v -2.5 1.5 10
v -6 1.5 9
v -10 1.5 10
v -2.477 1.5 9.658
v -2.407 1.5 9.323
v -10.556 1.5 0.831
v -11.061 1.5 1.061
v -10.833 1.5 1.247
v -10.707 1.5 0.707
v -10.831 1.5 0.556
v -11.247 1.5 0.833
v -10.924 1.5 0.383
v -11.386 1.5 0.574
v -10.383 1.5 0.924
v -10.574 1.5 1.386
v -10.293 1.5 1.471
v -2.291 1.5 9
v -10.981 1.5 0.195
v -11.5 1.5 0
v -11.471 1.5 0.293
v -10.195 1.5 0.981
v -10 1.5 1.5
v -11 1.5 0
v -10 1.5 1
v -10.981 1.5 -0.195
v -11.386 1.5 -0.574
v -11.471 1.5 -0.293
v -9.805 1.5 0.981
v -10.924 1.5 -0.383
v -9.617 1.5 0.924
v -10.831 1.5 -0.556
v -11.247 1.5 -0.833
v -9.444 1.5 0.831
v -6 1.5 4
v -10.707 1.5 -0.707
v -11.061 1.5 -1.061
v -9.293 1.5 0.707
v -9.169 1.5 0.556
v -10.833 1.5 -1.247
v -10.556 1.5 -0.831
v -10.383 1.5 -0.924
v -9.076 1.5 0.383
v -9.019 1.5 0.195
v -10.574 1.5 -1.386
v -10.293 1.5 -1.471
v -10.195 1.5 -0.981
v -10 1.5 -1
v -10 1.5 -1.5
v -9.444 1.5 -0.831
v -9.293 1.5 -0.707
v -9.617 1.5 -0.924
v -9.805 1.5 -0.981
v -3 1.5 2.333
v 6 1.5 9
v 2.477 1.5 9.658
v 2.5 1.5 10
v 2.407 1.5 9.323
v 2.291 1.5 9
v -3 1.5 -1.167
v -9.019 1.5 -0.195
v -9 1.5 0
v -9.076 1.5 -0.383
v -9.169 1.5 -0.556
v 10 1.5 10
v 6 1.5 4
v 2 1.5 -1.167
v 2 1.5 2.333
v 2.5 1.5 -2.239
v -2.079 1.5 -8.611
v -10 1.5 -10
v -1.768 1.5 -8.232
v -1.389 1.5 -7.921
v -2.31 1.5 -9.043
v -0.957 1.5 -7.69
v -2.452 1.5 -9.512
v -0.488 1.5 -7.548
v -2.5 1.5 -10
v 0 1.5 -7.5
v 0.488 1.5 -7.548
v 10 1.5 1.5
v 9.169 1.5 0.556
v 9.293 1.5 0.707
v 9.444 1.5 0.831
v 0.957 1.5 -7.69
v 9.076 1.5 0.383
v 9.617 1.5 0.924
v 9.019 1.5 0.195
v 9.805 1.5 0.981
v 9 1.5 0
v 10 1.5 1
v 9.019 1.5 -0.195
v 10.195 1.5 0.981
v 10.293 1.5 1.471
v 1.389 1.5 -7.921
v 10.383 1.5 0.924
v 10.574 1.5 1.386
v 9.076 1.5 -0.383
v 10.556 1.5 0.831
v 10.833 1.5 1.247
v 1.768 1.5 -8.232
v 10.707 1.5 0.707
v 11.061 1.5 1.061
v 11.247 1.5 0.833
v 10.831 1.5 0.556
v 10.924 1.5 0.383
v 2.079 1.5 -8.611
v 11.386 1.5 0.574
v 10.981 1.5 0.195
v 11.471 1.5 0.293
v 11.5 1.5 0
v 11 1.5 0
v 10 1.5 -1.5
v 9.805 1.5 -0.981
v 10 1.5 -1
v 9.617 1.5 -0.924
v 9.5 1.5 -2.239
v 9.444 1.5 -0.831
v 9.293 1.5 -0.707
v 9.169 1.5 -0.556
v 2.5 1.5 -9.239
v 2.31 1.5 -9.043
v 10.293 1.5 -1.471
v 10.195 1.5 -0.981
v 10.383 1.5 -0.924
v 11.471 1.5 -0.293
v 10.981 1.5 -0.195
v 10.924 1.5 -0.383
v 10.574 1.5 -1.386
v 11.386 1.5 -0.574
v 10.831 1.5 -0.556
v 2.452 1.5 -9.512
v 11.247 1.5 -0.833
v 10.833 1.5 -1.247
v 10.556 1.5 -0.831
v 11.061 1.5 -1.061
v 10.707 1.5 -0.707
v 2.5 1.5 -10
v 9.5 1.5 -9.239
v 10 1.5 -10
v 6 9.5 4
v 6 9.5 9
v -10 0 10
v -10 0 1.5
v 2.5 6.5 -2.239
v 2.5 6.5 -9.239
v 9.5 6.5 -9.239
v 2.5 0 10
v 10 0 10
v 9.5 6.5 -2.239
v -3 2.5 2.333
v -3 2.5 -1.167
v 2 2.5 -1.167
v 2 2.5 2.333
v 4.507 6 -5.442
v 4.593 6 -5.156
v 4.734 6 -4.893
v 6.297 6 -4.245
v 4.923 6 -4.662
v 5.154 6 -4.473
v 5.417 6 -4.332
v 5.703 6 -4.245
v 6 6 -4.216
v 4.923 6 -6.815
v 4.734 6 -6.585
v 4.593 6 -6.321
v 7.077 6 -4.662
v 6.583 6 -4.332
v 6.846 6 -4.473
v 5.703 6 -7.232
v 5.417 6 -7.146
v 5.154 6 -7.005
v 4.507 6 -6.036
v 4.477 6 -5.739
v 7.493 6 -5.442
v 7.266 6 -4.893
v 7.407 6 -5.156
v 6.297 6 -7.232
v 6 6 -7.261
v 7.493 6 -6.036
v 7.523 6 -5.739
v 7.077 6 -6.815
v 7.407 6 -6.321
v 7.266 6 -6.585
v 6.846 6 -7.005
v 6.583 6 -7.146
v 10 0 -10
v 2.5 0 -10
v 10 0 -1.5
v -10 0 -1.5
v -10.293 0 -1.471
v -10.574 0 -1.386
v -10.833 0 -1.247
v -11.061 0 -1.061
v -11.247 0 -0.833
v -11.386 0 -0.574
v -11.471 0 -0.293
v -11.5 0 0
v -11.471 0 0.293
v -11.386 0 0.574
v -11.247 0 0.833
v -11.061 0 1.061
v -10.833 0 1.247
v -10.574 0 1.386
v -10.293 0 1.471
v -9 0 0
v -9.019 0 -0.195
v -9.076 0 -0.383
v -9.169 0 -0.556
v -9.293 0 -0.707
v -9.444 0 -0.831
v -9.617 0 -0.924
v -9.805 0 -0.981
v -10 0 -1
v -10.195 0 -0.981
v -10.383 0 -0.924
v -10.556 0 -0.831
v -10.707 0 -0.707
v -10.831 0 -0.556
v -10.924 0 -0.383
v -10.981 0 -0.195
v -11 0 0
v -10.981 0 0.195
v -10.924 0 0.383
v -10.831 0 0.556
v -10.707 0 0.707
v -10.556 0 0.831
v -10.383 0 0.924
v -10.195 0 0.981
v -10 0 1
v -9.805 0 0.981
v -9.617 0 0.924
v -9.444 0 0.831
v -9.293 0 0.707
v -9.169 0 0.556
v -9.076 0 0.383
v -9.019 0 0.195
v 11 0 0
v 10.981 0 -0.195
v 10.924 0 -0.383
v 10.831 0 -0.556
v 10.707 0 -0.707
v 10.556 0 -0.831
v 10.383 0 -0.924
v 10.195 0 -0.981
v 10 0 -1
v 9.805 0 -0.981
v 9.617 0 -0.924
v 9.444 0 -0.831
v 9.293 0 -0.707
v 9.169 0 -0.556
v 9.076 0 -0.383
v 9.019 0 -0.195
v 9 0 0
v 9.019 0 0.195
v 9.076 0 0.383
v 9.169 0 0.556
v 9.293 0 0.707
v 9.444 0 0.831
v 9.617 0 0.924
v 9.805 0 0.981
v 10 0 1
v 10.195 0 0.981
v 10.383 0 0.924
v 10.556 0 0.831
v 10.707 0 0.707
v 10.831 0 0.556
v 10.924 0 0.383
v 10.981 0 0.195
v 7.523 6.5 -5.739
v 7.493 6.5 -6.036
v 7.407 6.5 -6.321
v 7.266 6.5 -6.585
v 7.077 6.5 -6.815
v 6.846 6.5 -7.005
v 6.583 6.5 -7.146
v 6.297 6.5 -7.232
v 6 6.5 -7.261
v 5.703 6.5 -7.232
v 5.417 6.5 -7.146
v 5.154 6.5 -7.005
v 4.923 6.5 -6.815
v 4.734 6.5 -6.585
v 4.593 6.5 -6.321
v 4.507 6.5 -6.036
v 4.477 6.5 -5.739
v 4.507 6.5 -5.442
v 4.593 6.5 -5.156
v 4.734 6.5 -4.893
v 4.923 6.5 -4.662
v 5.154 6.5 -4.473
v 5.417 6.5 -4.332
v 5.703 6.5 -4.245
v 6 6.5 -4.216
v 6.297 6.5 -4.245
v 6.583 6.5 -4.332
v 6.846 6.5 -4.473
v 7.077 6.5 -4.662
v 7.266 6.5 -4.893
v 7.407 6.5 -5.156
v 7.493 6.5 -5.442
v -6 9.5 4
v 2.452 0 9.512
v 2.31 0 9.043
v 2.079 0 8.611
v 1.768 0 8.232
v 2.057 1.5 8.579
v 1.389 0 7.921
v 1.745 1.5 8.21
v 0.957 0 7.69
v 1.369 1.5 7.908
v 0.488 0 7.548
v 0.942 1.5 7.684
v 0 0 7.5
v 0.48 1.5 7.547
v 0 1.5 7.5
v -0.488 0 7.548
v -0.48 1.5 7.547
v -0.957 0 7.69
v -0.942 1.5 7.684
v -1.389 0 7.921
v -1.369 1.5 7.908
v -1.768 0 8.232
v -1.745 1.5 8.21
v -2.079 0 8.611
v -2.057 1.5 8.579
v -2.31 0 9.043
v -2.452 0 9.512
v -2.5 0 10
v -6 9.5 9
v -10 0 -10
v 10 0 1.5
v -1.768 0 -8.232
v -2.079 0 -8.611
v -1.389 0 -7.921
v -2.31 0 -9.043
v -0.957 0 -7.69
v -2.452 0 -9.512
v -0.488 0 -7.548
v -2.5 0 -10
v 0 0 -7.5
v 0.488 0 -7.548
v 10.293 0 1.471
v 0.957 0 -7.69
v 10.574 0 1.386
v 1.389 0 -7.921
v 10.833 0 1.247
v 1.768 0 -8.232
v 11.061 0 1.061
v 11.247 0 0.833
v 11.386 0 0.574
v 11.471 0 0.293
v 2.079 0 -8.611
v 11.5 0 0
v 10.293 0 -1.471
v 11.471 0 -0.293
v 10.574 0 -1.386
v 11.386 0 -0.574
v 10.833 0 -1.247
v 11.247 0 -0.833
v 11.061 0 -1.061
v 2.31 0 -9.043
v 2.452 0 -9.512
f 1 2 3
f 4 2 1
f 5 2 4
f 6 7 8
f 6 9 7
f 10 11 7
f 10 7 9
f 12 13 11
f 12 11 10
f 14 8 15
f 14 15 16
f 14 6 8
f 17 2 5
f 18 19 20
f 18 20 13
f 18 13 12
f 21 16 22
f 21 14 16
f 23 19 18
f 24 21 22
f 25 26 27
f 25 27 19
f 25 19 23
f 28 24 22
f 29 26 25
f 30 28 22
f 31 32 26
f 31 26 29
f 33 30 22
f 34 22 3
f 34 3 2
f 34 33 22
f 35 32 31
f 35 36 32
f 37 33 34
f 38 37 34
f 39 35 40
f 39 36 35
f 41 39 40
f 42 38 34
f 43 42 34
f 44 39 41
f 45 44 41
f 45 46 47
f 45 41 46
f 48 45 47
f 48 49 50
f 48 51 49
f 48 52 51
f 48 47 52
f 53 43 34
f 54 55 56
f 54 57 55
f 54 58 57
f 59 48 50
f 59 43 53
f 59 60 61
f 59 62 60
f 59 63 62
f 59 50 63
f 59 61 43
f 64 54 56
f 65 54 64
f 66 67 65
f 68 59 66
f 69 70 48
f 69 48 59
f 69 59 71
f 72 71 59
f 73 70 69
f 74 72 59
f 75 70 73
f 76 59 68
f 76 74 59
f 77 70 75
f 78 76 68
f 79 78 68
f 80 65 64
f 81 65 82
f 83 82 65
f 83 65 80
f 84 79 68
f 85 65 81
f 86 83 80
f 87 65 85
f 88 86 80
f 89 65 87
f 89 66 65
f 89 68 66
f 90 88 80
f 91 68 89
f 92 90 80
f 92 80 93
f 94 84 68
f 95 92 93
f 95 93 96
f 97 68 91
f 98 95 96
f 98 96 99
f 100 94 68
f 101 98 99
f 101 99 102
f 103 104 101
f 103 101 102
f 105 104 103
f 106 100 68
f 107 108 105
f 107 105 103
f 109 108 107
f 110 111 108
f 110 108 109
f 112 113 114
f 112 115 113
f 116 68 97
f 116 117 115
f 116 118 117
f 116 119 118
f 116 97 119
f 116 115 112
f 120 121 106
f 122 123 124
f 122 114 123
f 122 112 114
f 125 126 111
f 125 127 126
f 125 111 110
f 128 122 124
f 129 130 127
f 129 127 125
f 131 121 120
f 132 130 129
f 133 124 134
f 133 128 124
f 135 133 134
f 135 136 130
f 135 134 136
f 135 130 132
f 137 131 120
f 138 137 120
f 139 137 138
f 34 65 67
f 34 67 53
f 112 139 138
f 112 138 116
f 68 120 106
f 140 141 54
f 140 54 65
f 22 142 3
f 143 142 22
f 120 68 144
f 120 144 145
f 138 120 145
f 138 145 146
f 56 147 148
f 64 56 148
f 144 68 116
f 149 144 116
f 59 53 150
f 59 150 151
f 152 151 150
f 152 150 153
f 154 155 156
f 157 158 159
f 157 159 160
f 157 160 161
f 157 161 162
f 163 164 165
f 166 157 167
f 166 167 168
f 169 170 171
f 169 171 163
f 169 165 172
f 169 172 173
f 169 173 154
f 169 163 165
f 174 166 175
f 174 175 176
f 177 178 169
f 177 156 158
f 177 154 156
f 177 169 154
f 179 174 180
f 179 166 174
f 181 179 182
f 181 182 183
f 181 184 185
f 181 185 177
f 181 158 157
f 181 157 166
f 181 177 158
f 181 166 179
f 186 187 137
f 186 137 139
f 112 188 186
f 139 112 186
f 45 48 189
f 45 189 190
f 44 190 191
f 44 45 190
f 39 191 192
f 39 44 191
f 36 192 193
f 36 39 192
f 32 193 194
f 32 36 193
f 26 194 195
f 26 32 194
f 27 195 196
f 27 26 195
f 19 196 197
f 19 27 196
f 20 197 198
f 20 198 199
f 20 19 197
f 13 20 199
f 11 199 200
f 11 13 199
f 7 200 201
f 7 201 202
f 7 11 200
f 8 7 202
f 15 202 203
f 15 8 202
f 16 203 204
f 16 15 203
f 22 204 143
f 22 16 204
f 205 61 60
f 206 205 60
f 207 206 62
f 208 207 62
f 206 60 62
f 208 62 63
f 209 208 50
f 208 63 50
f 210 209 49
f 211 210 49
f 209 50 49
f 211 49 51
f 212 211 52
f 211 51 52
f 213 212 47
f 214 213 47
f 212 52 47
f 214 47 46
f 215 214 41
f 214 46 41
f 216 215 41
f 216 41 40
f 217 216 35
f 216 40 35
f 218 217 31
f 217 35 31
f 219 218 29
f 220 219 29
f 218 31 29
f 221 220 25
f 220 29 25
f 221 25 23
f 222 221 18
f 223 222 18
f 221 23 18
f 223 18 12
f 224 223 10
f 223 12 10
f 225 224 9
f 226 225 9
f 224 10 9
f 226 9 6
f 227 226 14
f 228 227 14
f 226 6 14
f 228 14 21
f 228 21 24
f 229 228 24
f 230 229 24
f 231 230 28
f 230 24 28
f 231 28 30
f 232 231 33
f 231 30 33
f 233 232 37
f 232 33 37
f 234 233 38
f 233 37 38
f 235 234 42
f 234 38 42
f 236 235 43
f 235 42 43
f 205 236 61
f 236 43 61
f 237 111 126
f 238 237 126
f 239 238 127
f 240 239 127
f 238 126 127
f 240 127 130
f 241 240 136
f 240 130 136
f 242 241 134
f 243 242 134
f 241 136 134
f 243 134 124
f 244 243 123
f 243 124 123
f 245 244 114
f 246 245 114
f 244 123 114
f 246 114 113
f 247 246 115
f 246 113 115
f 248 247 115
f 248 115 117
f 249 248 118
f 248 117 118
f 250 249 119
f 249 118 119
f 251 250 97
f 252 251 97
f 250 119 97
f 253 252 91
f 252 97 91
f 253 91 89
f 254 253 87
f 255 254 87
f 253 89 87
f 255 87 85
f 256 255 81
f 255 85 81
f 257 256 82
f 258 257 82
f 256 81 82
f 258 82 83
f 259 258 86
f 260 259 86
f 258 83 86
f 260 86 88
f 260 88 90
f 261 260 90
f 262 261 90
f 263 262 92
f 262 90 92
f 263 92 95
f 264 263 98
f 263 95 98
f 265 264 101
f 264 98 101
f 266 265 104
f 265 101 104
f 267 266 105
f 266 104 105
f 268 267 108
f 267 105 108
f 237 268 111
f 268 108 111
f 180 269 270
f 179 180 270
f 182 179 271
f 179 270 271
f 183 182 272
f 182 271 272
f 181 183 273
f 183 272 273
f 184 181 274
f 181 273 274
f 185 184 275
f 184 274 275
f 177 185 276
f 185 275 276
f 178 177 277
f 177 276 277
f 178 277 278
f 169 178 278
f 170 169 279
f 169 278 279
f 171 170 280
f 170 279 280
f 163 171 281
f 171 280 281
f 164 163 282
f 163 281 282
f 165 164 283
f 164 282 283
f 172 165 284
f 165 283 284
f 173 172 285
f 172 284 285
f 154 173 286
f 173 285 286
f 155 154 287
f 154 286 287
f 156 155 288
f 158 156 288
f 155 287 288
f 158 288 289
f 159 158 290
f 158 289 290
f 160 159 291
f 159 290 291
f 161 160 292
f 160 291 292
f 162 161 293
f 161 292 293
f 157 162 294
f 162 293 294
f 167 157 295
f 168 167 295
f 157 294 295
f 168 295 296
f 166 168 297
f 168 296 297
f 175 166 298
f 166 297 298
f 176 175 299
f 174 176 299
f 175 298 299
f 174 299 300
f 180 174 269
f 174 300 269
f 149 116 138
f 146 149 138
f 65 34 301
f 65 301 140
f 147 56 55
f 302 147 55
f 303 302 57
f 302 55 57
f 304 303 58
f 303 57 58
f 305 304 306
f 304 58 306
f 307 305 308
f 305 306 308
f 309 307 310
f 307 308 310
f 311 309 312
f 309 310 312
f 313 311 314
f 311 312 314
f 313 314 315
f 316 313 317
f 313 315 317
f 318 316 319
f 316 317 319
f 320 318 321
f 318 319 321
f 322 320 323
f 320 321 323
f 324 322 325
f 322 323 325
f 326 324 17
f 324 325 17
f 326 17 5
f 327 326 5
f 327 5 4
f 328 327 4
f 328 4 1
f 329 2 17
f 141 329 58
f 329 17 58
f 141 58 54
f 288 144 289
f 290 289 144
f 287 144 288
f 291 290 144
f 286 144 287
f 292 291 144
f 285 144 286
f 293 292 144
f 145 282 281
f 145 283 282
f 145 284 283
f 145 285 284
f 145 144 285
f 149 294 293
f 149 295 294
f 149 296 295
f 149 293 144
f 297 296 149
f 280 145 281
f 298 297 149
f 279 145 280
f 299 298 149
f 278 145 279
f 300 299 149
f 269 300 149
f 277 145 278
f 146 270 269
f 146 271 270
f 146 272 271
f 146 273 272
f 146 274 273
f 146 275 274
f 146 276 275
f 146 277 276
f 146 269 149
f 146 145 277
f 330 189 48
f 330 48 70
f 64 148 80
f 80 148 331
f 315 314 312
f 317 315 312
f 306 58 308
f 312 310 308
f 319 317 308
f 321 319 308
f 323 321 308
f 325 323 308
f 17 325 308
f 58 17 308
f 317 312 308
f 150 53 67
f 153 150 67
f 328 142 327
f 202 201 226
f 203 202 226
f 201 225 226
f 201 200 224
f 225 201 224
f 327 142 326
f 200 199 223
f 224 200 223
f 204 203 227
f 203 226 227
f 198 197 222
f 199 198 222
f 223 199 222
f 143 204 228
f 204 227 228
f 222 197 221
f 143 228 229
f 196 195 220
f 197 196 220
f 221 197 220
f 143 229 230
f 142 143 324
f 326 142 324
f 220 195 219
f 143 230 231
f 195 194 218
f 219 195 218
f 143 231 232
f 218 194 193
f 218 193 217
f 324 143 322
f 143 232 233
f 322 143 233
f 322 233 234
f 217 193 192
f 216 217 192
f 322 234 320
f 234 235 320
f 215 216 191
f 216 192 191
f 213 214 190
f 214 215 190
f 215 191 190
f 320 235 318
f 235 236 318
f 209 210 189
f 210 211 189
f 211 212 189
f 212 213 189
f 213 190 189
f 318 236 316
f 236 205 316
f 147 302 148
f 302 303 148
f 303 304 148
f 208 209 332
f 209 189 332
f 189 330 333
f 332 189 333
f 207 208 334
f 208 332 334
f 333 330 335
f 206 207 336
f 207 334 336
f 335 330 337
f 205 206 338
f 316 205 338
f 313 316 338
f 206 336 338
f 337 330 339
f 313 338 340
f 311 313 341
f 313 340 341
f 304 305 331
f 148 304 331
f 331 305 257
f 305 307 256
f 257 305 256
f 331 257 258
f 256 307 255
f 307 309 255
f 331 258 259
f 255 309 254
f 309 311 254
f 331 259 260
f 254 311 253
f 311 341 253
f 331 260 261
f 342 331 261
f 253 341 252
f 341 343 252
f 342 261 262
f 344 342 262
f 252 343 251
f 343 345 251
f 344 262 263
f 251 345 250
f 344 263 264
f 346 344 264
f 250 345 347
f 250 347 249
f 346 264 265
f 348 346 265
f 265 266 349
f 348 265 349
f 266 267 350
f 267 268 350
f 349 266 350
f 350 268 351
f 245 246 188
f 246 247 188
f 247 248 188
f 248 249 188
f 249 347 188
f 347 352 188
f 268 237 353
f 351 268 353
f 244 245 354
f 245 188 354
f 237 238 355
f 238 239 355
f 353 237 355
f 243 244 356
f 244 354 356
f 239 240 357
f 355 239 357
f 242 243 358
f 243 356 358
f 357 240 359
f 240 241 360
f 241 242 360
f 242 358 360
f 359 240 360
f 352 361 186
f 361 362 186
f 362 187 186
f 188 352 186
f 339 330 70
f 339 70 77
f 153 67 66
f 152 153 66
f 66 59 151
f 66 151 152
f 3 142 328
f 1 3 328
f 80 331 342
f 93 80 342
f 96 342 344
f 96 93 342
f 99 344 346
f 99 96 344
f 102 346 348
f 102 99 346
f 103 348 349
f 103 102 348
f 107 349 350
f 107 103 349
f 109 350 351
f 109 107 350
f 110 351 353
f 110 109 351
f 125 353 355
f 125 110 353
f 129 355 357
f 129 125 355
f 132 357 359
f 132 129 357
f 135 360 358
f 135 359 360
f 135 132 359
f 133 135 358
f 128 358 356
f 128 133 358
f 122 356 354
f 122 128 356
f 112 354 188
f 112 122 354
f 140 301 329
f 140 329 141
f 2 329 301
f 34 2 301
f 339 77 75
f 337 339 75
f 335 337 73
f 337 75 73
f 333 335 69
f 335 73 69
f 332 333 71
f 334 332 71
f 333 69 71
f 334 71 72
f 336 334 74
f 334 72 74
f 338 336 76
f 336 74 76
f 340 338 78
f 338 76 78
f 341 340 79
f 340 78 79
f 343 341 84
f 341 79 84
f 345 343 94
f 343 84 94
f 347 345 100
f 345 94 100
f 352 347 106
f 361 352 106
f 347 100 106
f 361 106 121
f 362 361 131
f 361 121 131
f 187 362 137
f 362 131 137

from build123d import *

# Parameters (mm, degrees)
SKETCH2_W                       = 20
SKETCH2_H                       = 20
PCB_DEPTH                       = 1.5
SKETCH3_R                       = 1.5
SIDE_MOUNTING_HOLES_FRAME_DEPTH = 1.5
SKETCH4_R                       = 1
SIDE_MOUNTING_HOLES_DEPTH       = 1.5
SKETCH5_R                       = 2.5
SIDE_INLETS_DEPTH               = 1.5
SKETCH6_W                       = 12
SKETCH6_H                       = 5
BOSS_EXTRUDE3_DEPTH             = 8
SKETCH7_W                       = 7
SKETCH7_H                       = 7
BOSS_EXTRUDE4_DEPTH             = 5
SKETCH8_R                       = 1.522673679
CUT_EXTRUDE3_DEPTH              = 0.5
SKETCH9_W                       = 5
SKETCH9_H                       = 3.5
BOSS_EXTRUDE5_DEPTH             = 1


with BuildPart() as part:
    # Sketch2 → pcb (new body)
    with BuildSketch(Plane(origin=(0, 0, 0), x_dir=(1, 0, 0), z_dir=(0, 1, 0))):
        Rectangle(SKETCH2_W, SKETCH2_H)
    extrude(amount=PCB_DEPTH)

    # Sketch3 → side mounting holes frame (add)
    with BuildSketch(Plane(origin=(0, 1.5, 0), x_dir=(1, 0, 0), z_dir=(0, 1, 0))):
        with Locations((-10, 0)):
            Circle(SKETCH3_R)
        with Locations((10, 0)):
            Circle(SKETCH3_R)
    extrude(amount=-SIDE_MOUNTING_HOLES_FRAME_DEPTH)

    # Sketch4 → side mounting holes (cut)
    with BuildSketch(Plane(origin=(0, 1.5, 0), x_dir=(1, 0, 0), z_dir=(0, 1, 0))):
        with Locations((-10, 0)):
            Circle(SKETCH4_R)
        with Locations((10, 0)):
            Circle(SKETCH4_R)
    extrude(amount=-SIDE_MOUNTING_HOLES_DEPTH, mode=Mode.SUBTRACT)

    # Sketch5 → side inlets (cut)
    with BuildSketch(Plane(origin=(0, 1.5, 0), x_dir=(1, 0, 0), z_dir=(0, 1, 0))):
        with Locations((0, 10)):
            Circle(SKETCH5_R)
        with Locations((0, -10)):
            Circle(SKETCH5_R)
    extrude(amount=-SIDE_INLETS_DEPTH, mode=Mode.SUBTRACT)

    # Sketch6 → Boss-Extrude3 (add)
    with BuildSketch(Plane(origin=(0, 1.5, 0), x_dir=(1, 0, 0), z_dir=(0, 1, 0))):
        with Locations((0, -6.5)):
            Rectangle(SKETCH6_W, SKETCH6_H)
    extrude(amount=BOSS_EXTRUDE3_DEPTH)

    # Sketch7 → Boss-Extrude4 (add)
    with BuildSketch(Plane(origin=(0, 1.5, 0), x_dir=(1, 0, 0), z_dir=(0, 1, 0))):
        with Locations((6, 5.738753886)):
            Rectangle(SKETCH7_W, SKETCH7_H)
    extrude(amount=BOSS_EXTRUDE4_DEPTH)

    # Sketch8 → Cut-Extrude3 (cut)
    with BuildSketch(Plane(origin=(0, 6.5, 0), x_dir=(1, 0, 0), z_dir=(0, 1, 0))):
        with Locations((6, 5.738753886)):
            Circle(SKETCH8_R)
    extrude(amount=-CUT_EXTRUDE3_DEPTH, mode=Mode.SUBTRACT)

    # Sketch9 → Boss-Extrude5 (add)
    with BuildSketch(Plane(origin=(0, 1.5, 0), x_dir=(1, 0, 0), z_dir=(0, 1, 0))):
        with Locations((-0.5, -0.582791265)):
            Rectangle(SKETCH9_W, SKETCH9_H)
    extrude(amount=BOSS_EXTRUDE5_DEPTH)


solid = part.part
